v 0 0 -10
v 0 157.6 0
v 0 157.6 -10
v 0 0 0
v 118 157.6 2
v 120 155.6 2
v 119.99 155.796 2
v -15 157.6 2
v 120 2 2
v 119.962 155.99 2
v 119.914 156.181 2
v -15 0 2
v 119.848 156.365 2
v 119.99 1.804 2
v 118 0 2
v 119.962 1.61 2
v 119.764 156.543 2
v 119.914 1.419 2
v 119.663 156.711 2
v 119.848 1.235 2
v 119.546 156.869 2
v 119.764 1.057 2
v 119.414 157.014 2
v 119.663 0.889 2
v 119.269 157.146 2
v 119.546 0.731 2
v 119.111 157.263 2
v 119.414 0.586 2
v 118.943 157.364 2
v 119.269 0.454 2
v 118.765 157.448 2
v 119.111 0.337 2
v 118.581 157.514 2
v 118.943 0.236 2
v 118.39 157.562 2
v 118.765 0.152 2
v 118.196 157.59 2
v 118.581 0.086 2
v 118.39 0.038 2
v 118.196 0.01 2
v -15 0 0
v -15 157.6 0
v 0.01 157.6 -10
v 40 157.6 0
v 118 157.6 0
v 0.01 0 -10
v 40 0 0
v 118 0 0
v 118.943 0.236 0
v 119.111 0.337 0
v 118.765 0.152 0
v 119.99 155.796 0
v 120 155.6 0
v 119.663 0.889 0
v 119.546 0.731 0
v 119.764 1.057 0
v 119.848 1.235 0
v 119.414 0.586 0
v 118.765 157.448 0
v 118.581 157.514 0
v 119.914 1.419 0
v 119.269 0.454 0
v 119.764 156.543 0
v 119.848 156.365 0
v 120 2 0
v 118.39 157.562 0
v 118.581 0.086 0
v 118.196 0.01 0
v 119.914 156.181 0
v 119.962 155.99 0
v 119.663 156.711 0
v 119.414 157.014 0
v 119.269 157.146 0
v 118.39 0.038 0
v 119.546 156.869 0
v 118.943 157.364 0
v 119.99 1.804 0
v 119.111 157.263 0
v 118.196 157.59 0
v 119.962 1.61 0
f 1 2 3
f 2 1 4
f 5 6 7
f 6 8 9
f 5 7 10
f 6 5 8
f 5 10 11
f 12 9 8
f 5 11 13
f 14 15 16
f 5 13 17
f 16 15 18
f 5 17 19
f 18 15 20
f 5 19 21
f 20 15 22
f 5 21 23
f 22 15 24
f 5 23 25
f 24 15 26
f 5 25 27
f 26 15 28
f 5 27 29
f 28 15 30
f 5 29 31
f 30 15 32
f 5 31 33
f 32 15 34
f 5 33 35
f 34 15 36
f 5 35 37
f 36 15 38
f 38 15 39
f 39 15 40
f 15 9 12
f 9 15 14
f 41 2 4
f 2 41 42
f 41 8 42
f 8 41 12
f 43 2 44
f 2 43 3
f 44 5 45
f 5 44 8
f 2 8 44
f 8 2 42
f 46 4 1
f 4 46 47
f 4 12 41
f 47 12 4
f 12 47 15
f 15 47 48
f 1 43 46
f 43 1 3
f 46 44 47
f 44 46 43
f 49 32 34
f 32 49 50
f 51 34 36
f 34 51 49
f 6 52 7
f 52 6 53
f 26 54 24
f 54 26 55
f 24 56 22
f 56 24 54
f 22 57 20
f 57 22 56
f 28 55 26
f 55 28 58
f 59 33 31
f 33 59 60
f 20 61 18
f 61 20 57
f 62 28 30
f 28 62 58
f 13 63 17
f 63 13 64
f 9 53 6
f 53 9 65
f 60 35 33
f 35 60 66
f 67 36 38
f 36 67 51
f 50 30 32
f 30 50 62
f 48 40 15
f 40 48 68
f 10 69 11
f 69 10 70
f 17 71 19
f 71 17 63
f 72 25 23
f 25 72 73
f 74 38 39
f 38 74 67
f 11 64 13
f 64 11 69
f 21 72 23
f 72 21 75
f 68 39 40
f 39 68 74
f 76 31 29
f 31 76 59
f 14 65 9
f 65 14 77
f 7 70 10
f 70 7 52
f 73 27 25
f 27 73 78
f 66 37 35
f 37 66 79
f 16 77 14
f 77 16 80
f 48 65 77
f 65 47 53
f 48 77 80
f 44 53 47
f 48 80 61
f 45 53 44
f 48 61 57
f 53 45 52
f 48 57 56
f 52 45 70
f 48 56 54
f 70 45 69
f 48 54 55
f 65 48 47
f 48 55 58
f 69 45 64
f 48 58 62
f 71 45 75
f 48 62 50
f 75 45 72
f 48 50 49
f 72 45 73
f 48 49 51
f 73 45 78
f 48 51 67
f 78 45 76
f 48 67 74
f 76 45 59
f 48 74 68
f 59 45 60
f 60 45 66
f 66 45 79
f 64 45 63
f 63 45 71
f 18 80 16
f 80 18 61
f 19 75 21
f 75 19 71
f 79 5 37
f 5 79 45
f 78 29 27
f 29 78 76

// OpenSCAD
// file: lib/params.scad
// Shared parameters for the dowel desk shelf.
// Internally everything is mm (OpenSCAD's native unit); inch inputs are
// converted right where they're defined.

function in_to_mm(v) = v * 25.4;

// --- Dowel ---
// Standard inch dowel stock: 1/4, 3/8, 1/2, 5/8, 3/4, 1"
dowel_diameter_in = 3/4;
dowel_diameter    = in_to_mm(dowel_diameter_in);
dowel_tolerance   = 0.3;  // added to bore diameter for a snug press/slide fit
dowel_bore_depth  = 25;   // how far the dowel is captured inside the wall piece
dowel_length_in   = 36;   // length of the dowel rod stock, wall-mount face to wall-mount face
dowel_length      = in_to_mm(dowel_length_in);

// --- Dowel row (top edge of the wall bracket) ---
num_dowels        = 6;
dowel_min_wall    = 6;    // min plastic left between adjacent dowel bores
dowel_edge_margin = 10;   // plastic left outboard of the first/last dowel
dowel_row_offset  = 15;   // distance from the top edge down to the hole row
dowel_fillet_r    = 2;    // rounds the edge where each bore opens on the front face

dowel_bore_d   = dowel_diameter + dowel_tolerance;
dowel_spacing  = dowel_bore_d + dowel_min_wall; // center-to-center

// --- Wall bracket block ---
// "width" runs along the wall (left-right), "height" is vertical,
// "depth" is how far the block sticks out from the wall (front-back).
// Width is derived so all dowels fit with the margins/spacing above.
wall_bracket_width  = (num_dowels - 1) * dowel_spacing + dowel_bore_d + 2 * dowel_edge_margin;
wall_bracket_height = 140;
wall_bracket_depth  = dowel_bore_depth + 10; // bore depth + material behind it
corner_radius       = 4; // fillet radius on all 12 edges of the block

// --- Shelf panel slot ---
// A second, flat PLA shelf panel spans between the left and right wall
// brackets the same way the dowels do. Each bracket has a slot open on
// the same face as the dowel bores (X = wall_bracket_depth), running
// along Y nearly the full width, blind at shelf_slot_depth back from
// that face.
shelf_thickness  = 2;    // panel thickness the slot is sized around
shelf_clearance  = 0.3;  // added to slot height for a slide fit
shelf_slot_depth  = 15;  // along X, how far the panel is captured from the front face
shelf_slot_margin = 8;   // along Y, inset from the bracket's left/right edges
shelf_slot_z      = 30;  // height of the slot's vertical center, from the bottom

shelf_slot_h = shelf_thickness + shelf_clearance;
shelf_slot_w = wall_bracket_width -  shelf_slot_margin; // slot's extent along Y

// --- Shelf panel ---
// The panel that actually slides into the slot above.
shelf_width_clearance = 0.5; // subtracted from the slot width for an easy slide fit
shelf_corner_radius  = 2;    // rounds the panel's corners (kept well under half of shelf_thickness's plan dimensions)
// shelf_length = dowel_length - 2 * dowel_bore_depth + 2 * shelf_slot_depth; // total panel length, including the ends captured in each bracket's slot
shelf_length = 250;
shelf_width  = shelf_slot_w - shelf_width_clearance;

// --- Flat-top tray ---
// A printed surface that rests on the dowels: flat on top, with a
// half-round channel on the underside for each dowel so it cradles them.
// The channels line up with the bracket's dowel row (same Y positions).
tray_length        = 250; // along the dowels (X); sized for a 256x256 print bed
tray_top_thickness = 4;   // material above the top of the dowels
tray_wrap_depth    = 6;   // how far the clips on the two OUTER dowels extend below the
                          // dowel centerline (keep < dowel radius, ~9.7mm, or the channel
                          // becomes a closed tunnel; ~6 gives a snap-fit)
tray_clip_wall     = 3;   // plastic around each outer dowel's clip
tray_corner_radius = 2;   // rounds the tray's edges

tray_width  = wall_bracket_width; // spans the same dowel row as the brackets
tray_height = dowel_bore_d / 2 + tray_top_thickness; // flat slab; clips hang below it

// --- Half shelf (laptop support) ---
// A shorter, reinforced version of the shelf panel: slides into one
// bracket's shelf_slot groove (same slot, same fit as shelf_panel.scad)
// and cantilevers out toward the middle instead of spanning wall-to-wall.
// Use one against each of two brackets bounding a gap, so together they
// carry a laptop resting across both with a small gap between them.
// It sits below the dowel row and does not touch or rely on the dowels
// at all -- only the slot anchors it.
//
// A flat panel at shelf_thickness would sag/snap cantilevered this far,
// so the part captured in the slot tapers up to half_shelf_root_height
// and steps back down to shelf_thickness over half_shelf_taper_length,
// trading some slot clearance for a much stiffer root where the bending
// load is highest. If that's still not stiff enough, half_shelf_leg_drop
// adds a short leg near the far end that lets it rest on the desk below
// rather than stay fully cantilevered -- fine but not preferred.
half_shelf_length        = 120;  // total length from the slot's front-face
                                  // opening to the far (unsupported) end;
                                  // tune so two of these leave a small gap
                                  // at the midpoint of your actual span
half_shelf_root_height   = 12;   // thickness at the root (inside the slot
                                  // opening), tapering down to shelf_thickness
half_shelf_taper_length  = 40;   // how far along half_shelf_length the taper
                                  // from root_height down to shelf_thickness runs
half_shelf_leg_drop      = 0;    // extra material dropped from the underside
                                  // near the far end down to desk height, as a
                                  // last-resort support (0 disables it; set to
                                  // the measured gap from shelf underside to
                                  // desk surface to enable)
half_shelf_leg_length    = 20;   // how much of the far end the leg spans

// --- Rubber feet ---
// Shallow recesses in the bottom face (Z=0) so self-adhesive rubber feet
// sit flush, one near each of the four bottom corners.
// foot_diameter_in  = 0.25;
//foot_diameter     = in_to_mm(foot_diameter_in);
foot_diameter = 12;
foot_recess_depth = 1.5;  // just enough to seat the foot, not a structural pocket
foot_inset        = 10;   // distance from bottom-face edges to foot centers

// --- Print-friendliness ---
$fn = 64; // circle smoothness for previews/renders
// file: lib/bracket.scad
// Shared geometry for the wall-end bracket. Included by wall.scad and
// wall_mirrored.scad so both halves of the shelf stay in sync.

include <params.scad>

// Box with all 12 edges filleted to radius r, spanning [0,0,0] to size.
module rounded_box(size, r) {
    hull() {
        for (x = [r, size[0] - r])
            for (y = [r, size[1] - r])
                for (z = [r, size[2] - r])
                    translate([x, y, z]) sphere(r = r);
    }
}

// Thin slab spanning [0,0,0] to size, with all 4 vertical (Z-axis)
// edges rounded to radius r; top and bottom stay flat. Used for panels
// too thin for rounded_box's spherical corner fillets to make sense.
module rounded_slab(size, r) {
    linear_extrude(height = size[2])
        offset(r = r)
            offset(delta = -r)
                square([size[0], size[1]]);
}

// Slab spanning [0,0,0] to [length, width, thickness] with only the two
// far-end (X = length) corners rounded to radius r; the near end (X=0)
// stays square. Used where the near end is captured in a slot and the
// far end is the exposed, handled edge.
module rounded_tip_slab(length, width, thickness, r) {
    linear_extrude(height = thickness)
        hull() {
            square([length - r, width]);
            translate([length - r, r]) circle(r = r);
            translate([length - r, width - r]) circle(r = r);
        }
}

// A blind bore of diameter d and depth `depth`, aligned along +Z from
// z=0 (blind end) to z=depth (opening), with a concave fillet of radius
// `fillet_r` rounding the edge where the bore meets the opening face.
// Extends 1mm past z=depth so the opening cuts cleanly through a face.
module rounded_bore(d, depth, fillet_r) {
    r = d / 2;
    steps = 8;
    arc = [for (i = [0 : steps])
        let (theta = 180 - i * (90 / steps))
        [r + fillet_r + fillet_r * cos(theta), (depth - fillet_r) + fillet_r * sin(theta)]
    ];
    profile = concat(
        [[0, 0], [r, 0]],
        arc,
        [[r + fillet_r, depth + 1], [0, depth + 1]]
    );
    rotate_extrude(angle = 360)
        polygon(points = profile);
}

// A bore of diameter d and length `length` that runs the full length,
// open at both ends with a matching concave fillet of radius `fillet_r`
// rounding both openings. Used for a middle bracket the dowels pass
// through, as opposed to the wall-end brackets where they stop blind.
module through_bore(d, length, fillet_r) {
    r = d / 2;
    steps = 8;
    bottom_arc = [for (i = [0 : steps])
        let (theta = 270 - i * (90 / steps))
        [r + fillet_r + fillet_r * cos(theta), fillet_r + fillet_r * sin(theta)]
    ];
    top_arc = [for (i = [0 : steps])
        let (theta = 180 - i * (90 / steps))
        [r + fillet_r + fillet_r * cos(theta), (length - fillet_r) + fillet_r * sin(theta)]
    ];
    profile = concat(
        [[0, -1], [r + fillet_r, -1]],
        bottom_arc,
        top_arc,
        [[r + fillet_r, length + 1], [0, length + 1]]
    );
    rotate_extrude(angle = 360)
        polygon(points = profile);
}

// through_dowels=false (default): wall-end bracket, dowels stop blind
// inside it. through_dowels=true: middle bracket, dowels pass all the
// way through so the shelf doesn't have to span the full wall-to-wall
// distance in one piece.
module wall_bracket(through_dowels = false) {
    difference() {
        // Main block, flush against the wall on its back (X=0) face,
        // with rounded corners/edges everywhere.
        rounded_box([wall_bracket_depth, wall_bracket_width, wall_bracket_height], corner_radius);

        // Dowel row: bored in from the front face, running along the
        // depth (X) axis, evenly spaced along the top edge. Blind unless
        // through_dowels is set, in which case they pass all the way
        // through to the back face.
        for (i = [0 : num_dowels - 1]) {
            y = dowel_edge_margin + dowel_bore_d / 2 + i * dowel_spacing;
            z = wall_bracket_height - dowel_row_offset;
            if (through_dowels) {
                translate([0, y, z])
                    rotate([0, 90, 0])
                        through_bore(dowel_bore_d, wall_bracket_depth, dowel_fillet_r);
            } else {
                translate([wall_bracket_depth - dowel_bore_depth, y, z])
                    rotate([0, 90, 0])
                        rounded_bore(dowel_bore_d, dowel_bore_depth, dowel_fillet_r);
            }
        }

        // Shelf panel slot: open on the same front face as the dowel
        // bores (X = wall_bracket_depth), running along Y nearly the
        // full width, blind at shelf_slot_depth back from that face.
        translate([wall_bracket_depth - shelf_slot_depth,
                   shelf_slot_margin,
                   shelf_slot_z - shelf_slot_h / 2])
            cube([shelf_slot_depth + 1, shelf_slot_w, shelf_slot_h]);

        // Rubber foot recesses: shallow pockets in the bottom face,
        // one near each of the four bottom corners.
        for (x = [foot_inset, wall_bracket_depth - foot_inset])
            for (y = [foot_inset, wall_bracket_width - foot_inset])
                translate([x, y, -0.1])
                    cylinder(h = foot_recess_depth + 0.1, d = foot_diameter);
    }
}
// file: lib/half_shelf.scad
// Half shelf: a reinforced, shorter version of shelf_panel.scad that
// slides into one bracket's shelf_slot groove and cantilevers out
// toward the middle of a gap instead of spanning wall-to-wall. Two of
// these -- one per bracket, printed with half_shelf.scad or
// half_shelf_mirrored.scad depending on which way that bracket's slot
// is offset -- can together carry a laptop resting across both with a
// small gap between them. This sits at the shelf_slot's height, well
// below the dowel row, and does not touch or rely on the dowels.
//
// Local frame: X=0 is the slot's front-face opening (matches
// wall_bracket_depth in bracket.scad's frame); negative X is inside the
// slot cavity. Z=0 is the underside of the panel's normal (thin)
// section, Z=shelf_thickness is its top -- both match shelf_panel.scad's
// own frame, and the top surface stays at that same Z the whole way out
// so a laptop resting across two of these sits flat.
//
// A flat panel at shelf_thickness would sag/snap cantilevered this far,
// so material is added below the top surface near the root (inside the
// slot opening, where the bending load is highest) and tapers back down
// to the normal thickness over half_shelf_taper_length. If that's still
// not stiff enough for the load, half_shelf_leg_drop adds a support leg
// near the far end that lets the shelf rest on the desk below -- fine,
// but not preferred over staying cantilevered.

include <bracket.scad>

module half_shelf() {
    // Tab: identical slide-fit geometry to shelf_panel.scad's own edge,
    // captured in the bracket's existing shelf_slot.
    module tab() {
        translate([-shelf_slot_depth, 0, 0])
            cube([shelf_slot_depth, shelf_width, shelf_thickness]);
    }

    // Tapered root: wedge-shaped underside reinforcement, thickest at
    // the slot opening (X=0) and back to normal thickness by
    // X=half_shelf_taper_length. Built as a hull of two thin slivers so
    // the taper is linear.
    module root_taper() {
        hull() {
            translate([0, 0, shelf_thickness - half_shelf_root_height])
                cube([0.01, shelf_width, half_shelf_root_height]);
            translate([half_shelf_taper_length - 0.01, 0, 0])
                cube([0.01, shelf_width, shelf_thickness]);
        }
    }

    // Flat run: normal shelf_thickness slab from the end of the taper
    // out to the unsupported tip, with the tip's two outer corners
    // rounded (the near end here butts against the taper, so it stays
    // square).
    module flat_run() {
        translate([half_shelf_taper_length, 0, 0])
            rounded_tip_slab(half_shelf_length - half_shelf_taper_length, shelf_width, shelf_thickness, shelf_corner_radius);
    }

    // Optional last-resort leg: drops from the underside near the tip
    // down to desk height. Disabled (zero-height) unless
    // half_shelf_leg_drop is set.
    module leg() {
        if (half_shelf_leg_drop > 0)
            translate([half_shelf_length - half_shelf_leg_length, 0, -half_shelf_leg_drop])
                cube([half_shelf_leg_length, shelf_width, half_shelf_leg_drop]);
    }

    union() {
        tab();
        root_taper();
        flat_run();
        leg();
    }
}
// main file
// Half shelf: for use against a bracket in its non-mirrored orientation
// (e.g. wall.scad, wall_through.scad). See lib/half_shelf.scad for the
// full description of what this is for. The other end of the gap uses
// half_shelf_mirrored.scad, matched to whichever orientation that
// bracket was printed in.
//
// Render:
//   openscad -o export/half_shelf.stl scad/half_shelf.scad

include <lib/half_shelf.scad>

half_shelf();
